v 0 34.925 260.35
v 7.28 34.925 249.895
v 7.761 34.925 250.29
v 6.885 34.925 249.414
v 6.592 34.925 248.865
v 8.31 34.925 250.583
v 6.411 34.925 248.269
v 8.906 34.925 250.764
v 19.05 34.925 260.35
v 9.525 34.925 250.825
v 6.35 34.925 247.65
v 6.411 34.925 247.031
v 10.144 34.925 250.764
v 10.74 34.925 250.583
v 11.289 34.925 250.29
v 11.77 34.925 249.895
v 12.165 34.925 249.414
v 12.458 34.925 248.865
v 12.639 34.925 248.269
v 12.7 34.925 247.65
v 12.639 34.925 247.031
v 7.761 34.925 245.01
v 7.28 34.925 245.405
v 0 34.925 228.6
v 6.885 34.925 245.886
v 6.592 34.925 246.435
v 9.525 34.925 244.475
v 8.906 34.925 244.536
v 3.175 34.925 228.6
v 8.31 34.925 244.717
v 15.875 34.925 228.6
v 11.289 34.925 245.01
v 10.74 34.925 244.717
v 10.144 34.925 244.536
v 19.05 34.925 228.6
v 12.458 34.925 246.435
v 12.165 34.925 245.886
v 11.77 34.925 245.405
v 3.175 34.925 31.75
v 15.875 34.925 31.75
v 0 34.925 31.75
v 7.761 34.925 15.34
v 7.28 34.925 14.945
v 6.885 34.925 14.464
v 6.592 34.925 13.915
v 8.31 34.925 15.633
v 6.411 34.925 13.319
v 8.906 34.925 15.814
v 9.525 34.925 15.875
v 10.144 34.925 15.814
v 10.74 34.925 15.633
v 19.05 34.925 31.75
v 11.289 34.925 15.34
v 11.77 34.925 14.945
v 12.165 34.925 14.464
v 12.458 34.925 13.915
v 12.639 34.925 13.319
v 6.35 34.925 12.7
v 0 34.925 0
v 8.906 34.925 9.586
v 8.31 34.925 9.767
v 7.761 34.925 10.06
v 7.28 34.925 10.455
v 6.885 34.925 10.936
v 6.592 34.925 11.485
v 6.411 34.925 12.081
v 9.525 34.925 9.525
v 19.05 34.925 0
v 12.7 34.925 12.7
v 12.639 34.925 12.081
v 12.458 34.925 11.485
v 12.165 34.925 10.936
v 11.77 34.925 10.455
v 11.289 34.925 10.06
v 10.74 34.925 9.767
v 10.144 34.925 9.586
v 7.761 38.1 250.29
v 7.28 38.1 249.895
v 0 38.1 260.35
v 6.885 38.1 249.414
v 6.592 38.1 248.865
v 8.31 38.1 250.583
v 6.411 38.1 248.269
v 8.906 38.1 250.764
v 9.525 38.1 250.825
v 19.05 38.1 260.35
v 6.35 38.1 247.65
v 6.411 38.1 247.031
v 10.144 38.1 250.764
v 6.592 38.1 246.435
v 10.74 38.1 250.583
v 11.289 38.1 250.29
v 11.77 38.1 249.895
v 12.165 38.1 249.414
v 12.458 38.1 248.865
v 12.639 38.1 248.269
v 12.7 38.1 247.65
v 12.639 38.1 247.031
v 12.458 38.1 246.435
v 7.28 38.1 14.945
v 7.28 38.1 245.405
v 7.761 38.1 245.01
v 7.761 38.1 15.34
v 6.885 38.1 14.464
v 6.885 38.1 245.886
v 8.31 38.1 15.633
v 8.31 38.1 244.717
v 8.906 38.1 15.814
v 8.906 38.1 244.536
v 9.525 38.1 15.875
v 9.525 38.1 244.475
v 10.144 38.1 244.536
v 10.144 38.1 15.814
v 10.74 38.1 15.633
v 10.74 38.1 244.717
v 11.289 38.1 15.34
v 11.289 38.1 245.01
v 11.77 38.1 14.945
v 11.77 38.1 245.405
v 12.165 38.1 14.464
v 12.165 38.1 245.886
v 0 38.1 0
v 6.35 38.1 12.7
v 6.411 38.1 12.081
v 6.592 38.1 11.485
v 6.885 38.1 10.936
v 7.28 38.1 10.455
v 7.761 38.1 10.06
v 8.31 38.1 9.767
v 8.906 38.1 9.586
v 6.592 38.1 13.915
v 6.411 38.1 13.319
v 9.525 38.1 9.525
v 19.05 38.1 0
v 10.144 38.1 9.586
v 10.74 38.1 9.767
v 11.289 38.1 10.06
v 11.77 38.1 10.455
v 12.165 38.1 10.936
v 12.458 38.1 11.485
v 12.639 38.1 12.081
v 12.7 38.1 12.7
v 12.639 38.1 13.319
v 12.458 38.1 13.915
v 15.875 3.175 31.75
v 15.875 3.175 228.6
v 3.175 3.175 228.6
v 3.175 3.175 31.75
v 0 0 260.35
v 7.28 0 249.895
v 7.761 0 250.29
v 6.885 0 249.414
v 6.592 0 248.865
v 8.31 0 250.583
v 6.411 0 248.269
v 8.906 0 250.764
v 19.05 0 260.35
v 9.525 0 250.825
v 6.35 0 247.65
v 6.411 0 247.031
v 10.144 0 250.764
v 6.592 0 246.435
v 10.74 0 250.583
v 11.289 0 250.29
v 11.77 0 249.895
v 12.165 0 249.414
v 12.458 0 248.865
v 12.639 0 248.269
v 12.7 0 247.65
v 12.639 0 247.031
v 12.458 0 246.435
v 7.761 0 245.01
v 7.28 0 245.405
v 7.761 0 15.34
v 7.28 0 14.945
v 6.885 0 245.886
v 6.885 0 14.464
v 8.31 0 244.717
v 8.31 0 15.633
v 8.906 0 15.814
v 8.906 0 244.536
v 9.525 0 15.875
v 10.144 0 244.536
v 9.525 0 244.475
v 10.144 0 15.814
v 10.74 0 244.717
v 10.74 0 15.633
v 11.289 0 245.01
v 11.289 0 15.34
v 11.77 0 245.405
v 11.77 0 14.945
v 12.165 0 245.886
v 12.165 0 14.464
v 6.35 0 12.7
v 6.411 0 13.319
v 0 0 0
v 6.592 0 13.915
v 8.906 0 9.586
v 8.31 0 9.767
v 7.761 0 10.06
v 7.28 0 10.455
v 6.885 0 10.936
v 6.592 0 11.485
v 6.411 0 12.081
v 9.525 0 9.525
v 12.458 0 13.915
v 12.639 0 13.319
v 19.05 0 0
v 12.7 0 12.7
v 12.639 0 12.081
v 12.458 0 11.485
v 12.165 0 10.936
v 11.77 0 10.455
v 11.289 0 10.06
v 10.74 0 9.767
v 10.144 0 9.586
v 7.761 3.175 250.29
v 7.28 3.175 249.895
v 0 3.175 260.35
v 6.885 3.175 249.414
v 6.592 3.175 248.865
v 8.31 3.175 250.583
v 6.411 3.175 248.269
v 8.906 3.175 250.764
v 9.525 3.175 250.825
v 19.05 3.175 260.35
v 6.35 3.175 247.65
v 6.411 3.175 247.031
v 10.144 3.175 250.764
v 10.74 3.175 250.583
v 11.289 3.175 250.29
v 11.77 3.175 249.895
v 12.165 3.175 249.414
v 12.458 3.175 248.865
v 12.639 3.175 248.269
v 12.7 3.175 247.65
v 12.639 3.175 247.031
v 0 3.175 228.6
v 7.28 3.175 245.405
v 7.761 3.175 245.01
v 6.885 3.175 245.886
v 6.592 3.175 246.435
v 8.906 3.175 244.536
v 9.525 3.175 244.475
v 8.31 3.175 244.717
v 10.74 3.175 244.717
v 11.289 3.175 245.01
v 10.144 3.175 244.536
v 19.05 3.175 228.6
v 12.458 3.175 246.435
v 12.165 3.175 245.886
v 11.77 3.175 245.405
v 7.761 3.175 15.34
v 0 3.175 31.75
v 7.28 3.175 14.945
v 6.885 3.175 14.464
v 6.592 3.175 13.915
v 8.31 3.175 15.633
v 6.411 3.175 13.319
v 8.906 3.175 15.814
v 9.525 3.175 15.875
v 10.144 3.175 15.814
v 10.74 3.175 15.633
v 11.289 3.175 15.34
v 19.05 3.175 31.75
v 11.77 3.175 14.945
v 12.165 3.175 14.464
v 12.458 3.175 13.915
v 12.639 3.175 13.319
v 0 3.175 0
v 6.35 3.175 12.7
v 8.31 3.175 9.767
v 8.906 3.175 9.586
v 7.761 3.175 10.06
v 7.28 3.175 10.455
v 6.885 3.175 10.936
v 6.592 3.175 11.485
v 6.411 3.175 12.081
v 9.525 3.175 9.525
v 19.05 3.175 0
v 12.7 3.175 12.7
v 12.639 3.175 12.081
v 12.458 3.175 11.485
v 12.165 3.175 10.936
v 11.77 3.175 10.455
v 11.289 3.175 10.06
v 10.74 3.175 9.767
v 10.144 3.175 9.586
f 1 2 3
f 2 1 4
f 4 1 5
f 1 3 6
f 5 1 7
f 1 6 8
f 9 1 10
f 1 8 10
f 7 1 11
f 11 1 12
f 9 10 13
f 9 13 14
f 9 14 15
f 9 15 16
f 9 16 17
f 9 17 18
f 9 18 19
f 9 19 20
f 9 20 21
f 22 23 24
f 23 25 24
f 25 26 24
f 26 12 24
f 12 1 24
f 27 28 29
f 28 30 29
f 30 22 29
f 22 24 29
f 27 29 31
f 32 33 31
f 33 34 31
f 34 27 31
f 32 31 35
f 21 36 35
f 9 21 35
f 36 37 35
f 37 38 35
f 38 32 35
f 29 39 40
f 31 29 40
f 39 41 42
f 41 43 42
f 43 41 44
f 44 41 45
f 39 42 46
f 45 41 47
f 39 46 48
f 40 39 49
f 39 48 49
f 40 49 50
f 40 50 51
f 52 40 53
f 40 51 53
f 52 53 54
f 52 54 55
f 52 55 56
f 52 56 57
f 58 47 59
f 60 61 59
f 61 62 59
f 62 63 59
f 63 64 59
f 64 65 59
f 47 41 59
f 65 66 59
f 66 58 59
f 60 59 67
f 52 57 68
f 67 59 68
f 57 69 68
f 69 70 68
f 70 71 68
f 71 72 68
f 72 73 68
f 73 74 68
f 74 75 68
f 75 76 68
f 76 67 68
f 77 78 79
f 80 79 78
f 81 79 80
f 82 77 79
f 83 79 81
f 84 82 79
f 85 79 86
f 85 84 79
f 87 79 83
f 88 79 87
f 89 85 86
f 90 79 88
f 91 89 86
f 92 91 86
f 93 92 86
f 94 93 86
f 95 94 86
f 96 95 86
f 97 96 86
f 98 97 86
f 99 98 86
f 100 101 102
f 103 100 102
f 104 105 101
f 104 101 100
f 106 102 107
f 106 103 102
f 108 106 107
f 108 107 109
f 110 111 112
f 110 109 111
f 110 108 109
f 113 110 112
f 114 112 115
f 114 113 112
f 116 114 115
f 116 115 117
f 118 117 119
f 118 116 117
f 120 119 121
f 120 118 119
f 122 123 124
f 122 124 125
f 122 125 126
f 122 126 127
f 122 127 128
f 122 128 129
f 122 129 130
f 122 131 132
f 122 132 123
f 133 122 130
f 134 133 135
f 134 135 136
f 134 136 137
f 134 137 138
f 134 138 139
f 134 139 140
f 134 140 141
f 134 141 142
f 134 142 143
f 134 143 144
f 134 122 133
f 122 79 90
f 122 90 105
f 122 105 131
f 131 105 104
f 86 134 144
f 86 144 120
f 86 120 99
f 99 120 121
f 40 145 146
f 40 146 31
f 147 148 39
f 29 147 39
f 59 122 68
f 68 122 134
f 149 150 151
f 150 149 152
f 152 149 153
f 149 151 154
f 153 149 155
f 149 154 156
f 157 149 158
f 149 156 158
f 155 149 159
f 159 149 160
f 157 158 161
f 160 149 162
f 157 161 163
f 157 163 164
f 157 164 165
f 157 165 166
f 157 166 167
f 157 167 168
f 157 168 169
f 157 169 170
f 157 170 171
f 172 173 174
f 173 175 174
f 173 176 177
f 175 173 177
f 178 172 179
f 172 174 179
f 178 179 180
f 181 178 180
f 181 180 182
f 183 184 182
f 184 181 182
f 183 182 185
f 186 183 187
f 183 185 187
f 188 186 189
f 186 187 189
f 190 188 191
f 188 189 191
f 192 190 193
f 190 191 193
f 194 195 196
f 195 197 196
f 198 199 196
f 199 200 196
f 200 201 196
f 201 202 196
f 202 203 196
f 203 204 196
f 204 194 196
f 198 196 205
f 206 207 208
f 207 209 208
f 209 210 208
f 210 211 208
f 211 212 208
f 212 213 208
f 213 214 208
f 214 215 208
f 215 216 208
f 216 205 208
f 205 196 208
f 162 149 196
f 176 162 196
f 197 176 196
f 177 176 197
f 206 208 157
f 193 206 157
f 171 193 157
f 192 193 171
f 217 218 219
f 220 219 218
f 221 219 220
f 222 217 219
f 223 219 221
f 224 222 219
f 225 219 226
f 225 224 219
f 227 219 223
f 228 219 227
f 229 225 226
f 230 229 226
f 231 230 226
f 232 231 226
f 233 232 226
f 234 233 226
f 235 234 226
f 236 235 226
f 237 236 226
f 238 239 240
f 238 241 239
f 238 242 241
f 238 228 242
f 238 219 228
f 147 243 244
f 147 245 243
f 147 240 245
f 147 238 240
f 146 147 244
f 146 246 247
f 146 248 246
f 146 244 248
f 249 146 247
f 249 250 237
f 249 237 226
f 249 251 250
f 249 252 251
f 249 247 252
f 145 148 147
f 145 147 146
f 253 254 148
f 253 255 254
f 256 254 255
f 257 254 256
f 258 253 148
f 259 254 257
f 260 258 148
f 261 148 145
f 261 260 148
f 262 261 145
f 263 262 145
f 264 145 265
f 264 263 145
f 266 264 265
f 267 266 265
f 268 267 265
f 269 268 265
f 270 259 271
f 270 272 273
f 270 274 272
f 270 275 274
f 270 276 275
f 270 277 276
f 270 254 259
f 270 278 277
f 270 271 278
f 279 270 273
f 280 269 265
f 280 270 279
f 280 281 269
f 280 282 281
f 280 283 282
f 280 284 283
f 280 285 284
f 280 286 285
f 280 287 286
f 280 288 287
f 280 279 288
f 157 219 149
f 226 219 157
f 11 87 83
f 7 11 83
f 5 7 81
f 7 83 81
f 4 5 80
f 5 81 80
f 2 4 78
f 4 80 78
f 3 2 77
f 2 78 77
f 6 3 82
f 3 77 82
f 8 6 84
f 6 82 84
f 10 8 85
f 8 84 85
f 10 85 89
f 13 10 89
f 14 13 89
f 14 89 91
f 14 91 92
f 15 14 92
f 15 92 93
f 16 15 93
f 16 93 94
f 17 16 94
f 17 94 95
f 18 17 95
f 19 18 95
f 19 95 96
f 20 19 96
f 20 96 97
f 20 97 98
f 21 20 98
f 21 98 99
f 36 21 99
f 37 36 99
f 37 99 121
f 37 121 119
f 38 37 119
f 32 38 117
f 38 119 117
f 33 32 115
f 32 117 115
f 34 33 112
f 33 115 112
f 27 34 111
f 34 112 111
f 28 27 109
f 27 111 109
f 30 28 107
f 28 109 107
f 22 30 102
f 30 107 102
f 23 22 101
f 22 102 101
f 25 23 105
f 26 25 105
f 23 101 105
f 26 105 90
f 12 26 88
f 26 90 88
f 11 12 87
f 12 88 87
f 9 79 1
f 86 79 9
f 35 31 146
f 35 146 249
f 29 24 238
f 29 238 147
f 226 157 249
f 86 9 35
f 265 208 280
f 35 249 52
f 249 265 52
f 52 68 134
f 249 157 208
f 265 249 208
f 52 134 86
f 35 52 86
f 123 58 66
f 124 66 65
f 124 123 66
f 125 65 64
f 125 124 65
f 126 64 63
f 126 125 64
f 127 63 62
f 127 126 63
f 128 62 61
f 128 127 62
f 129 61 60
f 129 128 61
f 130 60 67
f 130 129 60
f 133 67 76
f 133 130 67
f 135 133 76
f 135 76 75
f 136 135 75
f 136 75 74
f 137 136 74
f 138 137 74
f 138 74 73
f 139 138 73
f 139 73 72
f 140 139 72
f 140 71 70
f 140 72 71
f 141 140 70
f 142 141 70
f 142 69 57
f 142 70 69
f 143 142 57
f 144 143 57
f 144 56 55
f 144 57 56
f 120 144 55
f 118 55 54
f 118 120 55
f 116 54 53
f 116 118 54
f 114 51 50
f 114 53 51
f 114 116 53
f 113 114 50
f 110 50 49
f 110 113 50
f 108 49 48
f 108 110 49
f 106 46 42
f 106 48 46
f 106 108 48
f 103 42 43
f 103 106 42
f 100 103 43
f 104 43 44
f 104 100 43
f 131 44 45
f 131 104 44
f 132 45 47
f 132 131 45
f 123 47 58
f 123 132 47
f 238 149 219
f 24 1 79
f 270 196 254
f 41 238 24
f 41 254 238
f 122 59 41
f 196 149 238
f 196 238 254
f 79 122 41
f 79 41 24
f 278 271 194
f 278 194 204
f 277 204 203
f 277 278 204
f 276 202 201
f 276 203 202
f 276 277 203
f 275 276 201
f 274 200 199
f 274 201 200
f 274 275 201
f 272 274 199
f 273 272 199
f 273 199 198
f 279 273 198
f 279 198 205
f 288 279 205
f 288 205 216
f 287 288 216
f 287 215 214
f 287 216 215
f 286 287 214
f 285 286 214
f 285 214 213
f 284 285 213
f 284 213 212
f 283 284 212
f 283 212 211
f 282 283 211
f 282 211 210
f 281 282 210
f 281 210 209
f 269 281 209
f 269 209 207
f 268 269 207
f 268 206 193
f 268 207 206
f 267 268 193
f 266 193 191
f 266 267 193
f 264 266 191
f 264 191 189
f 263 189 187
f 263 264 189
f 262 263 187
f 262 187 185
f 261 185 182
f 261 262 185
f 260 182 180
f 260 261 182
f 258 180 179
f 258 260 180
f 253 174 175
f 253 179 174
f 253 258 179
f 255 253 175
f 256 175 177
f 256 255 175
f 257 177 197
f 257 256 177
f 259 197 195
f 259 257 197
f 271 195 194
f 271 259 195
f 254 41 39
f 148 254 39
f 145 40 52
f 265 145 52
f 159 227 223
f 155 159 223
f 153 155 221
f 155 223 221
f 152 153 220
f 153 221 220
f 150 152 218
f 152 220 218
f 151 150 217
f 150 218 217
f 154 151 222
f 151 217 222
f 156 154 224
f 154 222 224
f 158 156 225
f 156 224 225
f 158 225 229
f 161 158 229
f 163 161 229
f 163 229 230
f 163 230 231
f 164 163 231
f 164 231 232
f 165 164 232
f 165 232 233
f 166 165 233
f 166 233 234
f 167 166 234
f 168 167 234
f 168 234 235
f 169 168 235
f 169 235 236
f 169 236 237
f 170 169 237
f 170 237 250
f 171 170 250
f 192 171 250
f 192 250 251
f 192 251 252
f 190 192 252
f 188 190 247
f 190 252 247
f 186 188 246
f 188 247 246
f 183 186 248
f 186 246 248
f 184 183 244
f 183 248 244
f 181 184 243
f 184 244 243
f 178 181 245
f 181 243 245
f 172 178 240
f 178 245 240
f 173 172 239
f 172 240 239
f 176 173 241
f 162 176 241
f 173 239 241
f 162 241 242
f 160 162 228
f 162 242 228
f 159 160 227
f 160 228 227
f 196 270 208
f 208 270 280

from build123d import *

# Parameters (mm, degrees)
SKETCH1_W           = 19.05
SKETCH1_H           = 38.1
SKETCH1_W_2         = 12.7
SKETCH1_H_2         = 31.75
BOSS_EXTRUDE1_DEPTH = 260.35
SKETCH2_W           = 19.05
SKETCH2_H           = 31.75
CUT_EXTRUDE1_DEPTH  = 31.75
SKETCH3_R           = 3.175
CUT_EXTRUDE2_DEPTH  = 264.811741589


with BuildPart() as part:
    # Sketch1 → Boss-Extrude1 (new body)
    with BuildSketch(Plane.XY):
        with Locations((9.525, 19.05)):
            Rectangle(SKETCH1_W, SKETCH1_H)
        with Locations((9.525, 19.05)):
            Rectangle(SKETCH1_W_2, SKETCH1_H_2, mode=Mode.SUBTRACT)
    extrude(amount=BOSS_EXTRUDE1_DEPTH)

    # Sketch2 → Cut-Extrude1 (cut)
    with BuildSketch(Plane.XY.offset(260.35)):
        with Locations((9.525, 19.05)):
            Rectangle(SKETCH2_W, SKETCH2_H)
    cut_extrude1 = extrude(amount=-CUT_EXTRUDE1_DEPTH, mode=Mode.SUBTRACT)

    # Sketch3 → Cut-Extrude2 (cut, through all)
    with BuildSketch(Plane(origin=(0, 38.1, 0), x_dir=(1, 0, 0), z_dir=(0, 1, 0))):
        with Locations(Location((9.525, -247.65, 0), (0, 0, 180))):
            Circle(SKETCH3_R)
    cut_extrude2 = extrude(amount=-CUT_EXTRUDE2_DEPTH, mode=Mode.SUBTRACT)

    # Mirror1: Cut-Extrude1, Cut-Extrude2 across plane
    add(cut_extrude1.mirror(Plane.XY.offset(130.175)), mode=Mode.SUBTRACT)
    add(cut_extrude2.mirror(Plane.XY.offset(130.175)), mode=Mode.SUBTRACT)


solid = part.part
